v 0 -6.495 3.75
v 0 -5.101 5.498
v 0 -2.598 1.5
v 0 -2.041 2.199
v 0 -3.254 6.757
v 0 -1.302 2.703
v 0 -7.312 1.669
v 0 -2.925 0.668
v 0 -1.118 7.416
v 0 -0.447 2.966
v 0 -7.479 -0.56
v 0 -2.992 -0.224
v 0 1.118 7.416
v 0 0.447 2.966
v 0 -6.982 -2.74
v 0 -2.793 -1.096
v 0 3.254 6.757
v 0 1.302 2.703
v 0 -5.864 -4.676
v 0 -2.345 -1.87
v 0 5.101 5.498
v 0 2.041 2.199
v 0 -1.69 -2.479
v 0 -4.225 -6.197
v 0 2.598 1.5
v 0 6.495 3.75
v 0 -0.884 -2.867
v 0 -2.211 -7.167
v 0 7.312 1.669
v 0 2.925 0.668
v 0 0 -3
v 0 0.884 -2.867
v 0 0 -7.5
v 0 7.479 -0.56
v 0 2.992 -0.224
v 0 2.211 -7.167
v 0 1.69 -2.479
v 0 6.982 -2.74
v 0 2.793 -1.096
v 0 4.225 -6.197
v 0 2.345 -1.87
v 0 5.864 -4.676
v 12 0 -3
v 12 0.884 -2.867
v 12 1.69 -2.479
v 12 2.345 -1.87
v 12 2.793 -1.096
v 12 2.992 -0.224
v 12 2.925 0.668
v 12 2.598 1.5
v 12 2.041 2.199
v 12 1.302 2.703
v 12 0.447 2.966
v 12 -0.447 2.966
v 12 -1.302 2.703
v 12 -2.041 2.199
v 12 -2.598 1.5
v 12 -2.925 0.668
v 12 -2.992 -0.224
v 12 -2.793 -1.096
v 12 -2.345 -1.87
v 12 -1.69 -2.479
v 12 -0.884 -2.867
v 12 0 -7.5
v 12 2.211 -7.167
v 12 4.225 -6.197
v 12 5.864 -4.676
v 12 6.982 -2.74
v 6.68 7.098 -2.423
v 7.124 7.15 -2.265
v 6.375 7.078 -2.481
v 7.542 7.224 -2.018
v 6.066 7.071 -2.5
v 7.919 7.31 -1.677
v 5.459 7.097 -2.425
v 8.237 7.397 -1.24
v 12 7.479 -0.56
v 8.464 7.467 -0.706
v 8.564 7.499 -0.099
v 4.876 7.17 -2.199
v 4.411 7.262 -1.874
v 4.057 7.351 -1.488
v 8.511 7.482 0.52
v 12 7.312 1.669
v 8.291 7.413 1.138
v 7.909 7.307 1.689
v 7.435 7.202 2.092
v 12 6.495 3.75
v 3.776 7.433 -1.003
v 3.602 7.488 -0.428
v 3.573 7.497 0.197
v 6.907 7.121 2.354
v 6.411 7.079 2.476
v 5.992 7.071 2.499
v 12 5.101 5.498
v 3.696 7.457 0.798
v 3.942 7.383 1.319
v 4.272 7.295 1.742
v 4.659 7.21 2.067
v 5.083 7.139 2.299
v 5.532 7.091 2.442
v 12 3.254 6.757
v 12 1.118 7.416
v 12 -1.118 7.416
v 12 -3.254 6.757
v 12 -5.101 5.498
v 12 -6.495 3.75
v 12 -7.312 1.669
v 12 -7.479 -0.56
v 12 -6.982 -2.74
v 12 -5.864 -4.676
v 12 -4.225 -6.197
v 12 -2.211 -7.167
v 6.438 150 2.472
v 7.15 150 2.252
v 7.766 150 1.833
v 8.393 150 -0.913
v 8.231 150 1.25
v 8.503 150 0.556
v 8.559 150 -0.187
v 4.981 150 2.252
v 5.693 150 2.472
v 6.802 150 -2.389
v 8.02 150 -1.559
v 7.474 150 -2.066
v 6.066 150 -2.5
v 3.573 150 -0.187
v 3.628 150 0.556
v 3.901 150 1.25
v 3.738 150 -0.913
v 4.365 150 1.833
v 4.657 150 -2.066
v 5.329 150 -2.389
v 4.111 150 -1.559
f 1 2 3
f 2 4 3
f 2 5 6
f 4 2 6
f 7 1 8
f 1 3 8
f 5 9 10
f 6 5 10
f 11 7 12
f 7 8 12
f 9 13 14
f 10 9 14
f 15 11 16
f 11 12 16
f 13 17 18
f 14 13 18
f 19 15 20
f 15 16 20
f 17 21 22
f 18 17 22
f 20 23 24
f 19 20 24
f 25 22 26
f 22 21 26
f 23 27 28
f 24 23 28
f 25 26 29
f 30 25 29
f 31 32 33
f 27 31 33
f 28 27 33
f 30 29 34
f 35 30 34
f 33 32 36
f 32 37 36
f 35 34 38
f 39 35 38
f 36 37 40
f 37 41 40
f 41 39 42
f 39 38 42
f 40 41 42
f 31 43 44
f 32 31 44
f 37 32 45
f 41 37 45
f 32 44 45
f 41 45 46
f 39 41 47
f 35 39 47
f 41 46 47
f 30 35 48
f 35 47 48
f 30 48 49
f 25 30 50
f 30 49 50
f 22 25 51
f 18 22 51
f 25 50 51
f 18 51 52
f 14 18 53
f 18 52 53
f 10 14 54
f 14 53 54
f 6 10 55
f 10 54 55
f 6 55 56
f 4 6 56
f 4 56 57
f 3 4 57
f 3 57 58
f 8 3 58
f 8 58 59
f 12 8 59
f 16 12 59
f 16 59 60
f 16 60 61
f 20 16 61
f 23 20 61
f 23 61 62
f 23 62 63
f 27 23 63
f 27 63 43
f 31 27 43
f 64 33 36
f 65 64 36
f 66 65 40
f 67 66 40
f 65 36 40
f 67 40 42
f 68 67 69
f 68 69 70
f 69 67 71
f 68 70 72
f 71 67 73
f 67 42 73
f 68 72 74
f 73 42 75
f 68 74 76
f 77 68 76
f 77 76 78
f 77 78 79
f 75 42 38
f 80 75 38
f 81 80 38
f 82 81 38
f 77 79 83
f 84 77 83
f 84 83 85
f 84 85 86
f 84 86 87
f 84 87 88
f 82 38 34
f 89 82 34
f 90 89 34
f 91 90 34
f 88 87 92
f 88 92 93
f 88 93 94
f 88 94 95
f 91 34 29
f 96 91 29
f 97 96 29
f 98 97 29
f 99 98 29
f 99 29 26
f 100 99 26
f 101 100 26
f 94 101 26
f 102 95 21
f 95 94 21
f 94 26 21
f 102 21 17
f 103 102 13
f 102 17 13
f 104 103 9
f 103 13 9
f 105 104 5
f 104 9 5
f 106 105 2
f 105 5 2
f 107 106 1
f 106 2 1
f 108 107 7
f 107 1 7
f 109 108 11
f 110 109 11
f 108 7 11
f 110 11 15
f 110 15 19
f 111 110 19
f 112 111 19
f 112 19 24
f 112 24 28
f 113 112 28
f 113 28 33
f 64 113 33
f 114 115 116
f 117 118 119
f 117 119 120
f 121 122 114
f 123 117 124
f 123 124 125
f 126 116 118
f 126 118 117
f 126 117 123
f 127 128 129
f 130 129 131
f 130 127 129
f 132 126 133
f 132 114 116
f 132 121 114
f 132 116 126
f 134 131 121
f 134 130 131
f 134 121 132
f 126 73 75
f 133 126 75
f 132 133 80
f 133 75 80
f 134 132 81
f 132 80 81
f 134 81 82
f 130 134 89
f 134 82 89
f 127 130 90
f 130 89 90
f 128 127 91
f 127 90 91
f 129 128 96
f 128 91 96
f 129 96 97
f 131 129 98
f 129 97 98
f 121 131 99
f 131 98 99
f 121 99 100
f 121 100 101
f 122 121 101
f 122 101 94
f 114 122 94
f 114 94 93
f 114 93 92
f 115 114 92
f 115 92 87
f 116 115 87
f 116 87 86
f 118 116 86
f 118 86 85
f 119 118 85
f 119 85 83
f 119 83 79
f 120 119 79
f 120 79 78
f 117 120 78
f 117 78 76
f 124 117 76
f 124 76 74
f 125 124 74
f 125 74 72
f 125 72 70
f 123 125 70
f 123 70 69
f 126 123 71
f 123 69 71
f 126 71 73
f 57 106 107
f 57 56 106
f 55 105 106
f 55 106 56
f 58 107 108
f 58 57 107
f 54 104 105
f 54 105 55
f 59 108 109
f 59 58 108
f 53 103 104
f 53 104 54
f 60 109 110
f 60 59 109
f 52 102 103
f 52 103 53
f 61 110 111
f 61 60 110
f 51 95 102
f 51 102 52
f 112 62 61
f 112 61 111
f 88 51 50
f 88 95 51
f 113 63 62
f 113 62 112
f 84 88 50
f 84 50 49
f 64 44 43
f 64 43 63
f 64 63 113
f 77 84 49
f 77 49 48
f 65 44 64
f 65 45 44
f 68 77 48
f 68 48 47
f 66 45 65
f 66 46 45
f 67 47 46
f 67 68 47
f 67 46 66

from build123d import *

# Parameters (mm, degrees)
SKETCH_1_R          = 7.5
EXTRUDE_1_DEPTH     = 12
SKETCH_3_R          = 2.5
EXTRUDE_2_DEPTH     = 150
CUT_EXTRUDE_1_REACH = 152.666
SKETCH_2_R          = 3


with BuildPart() as part:
    # 草图1 → 凸台-拉伸1 (new body)
    with BuildSketch(Plane(origin=(0, 0, 0), x_dir=(0, 0, -1), z_dir=(1, 0, 0))):
        Circle(SKETCH_1_R)
    extrude(amount=EXTRUDE_1_DEPTH)

    # 草图3 → 凸台-拉伸2 (add)
    with BuildSketch(Plane(origin=(0, 0, 0), x_dir=(1, 0, 0), z_dir=(0, 1, 0))):
        with Locations(Location((6.065609695, 0, 0), (0, 0, 90))):
            Circle(SKETCH_3_R)
    extrude(amount=EXTRUDE_2_DEPTH)

    # 草图2 → 切除-拉伸1 (cut, up to next)
    with BuildSketch(Plane(origin=(12, 0, 0), x_dir=(0, 0, -1), z_dir=(1, 0, 0)), mode=Mode.PRIVATE) as cut_extrude_1_sk1:
        Circle(SKETCH_2_R)
    cut_extrude_1_tool1 = extrude(cut_extrude_1_sk1.sketch, amount=-CUT_EXTRUDE_1_REACH, mode=Mode.PRIVATE) & part.part
    add(cut_extrude_1_tool1.solids().sort_by_distance((12, 0, 0))[0], mode=Mode.SUBTRACT)


solid = part.part
